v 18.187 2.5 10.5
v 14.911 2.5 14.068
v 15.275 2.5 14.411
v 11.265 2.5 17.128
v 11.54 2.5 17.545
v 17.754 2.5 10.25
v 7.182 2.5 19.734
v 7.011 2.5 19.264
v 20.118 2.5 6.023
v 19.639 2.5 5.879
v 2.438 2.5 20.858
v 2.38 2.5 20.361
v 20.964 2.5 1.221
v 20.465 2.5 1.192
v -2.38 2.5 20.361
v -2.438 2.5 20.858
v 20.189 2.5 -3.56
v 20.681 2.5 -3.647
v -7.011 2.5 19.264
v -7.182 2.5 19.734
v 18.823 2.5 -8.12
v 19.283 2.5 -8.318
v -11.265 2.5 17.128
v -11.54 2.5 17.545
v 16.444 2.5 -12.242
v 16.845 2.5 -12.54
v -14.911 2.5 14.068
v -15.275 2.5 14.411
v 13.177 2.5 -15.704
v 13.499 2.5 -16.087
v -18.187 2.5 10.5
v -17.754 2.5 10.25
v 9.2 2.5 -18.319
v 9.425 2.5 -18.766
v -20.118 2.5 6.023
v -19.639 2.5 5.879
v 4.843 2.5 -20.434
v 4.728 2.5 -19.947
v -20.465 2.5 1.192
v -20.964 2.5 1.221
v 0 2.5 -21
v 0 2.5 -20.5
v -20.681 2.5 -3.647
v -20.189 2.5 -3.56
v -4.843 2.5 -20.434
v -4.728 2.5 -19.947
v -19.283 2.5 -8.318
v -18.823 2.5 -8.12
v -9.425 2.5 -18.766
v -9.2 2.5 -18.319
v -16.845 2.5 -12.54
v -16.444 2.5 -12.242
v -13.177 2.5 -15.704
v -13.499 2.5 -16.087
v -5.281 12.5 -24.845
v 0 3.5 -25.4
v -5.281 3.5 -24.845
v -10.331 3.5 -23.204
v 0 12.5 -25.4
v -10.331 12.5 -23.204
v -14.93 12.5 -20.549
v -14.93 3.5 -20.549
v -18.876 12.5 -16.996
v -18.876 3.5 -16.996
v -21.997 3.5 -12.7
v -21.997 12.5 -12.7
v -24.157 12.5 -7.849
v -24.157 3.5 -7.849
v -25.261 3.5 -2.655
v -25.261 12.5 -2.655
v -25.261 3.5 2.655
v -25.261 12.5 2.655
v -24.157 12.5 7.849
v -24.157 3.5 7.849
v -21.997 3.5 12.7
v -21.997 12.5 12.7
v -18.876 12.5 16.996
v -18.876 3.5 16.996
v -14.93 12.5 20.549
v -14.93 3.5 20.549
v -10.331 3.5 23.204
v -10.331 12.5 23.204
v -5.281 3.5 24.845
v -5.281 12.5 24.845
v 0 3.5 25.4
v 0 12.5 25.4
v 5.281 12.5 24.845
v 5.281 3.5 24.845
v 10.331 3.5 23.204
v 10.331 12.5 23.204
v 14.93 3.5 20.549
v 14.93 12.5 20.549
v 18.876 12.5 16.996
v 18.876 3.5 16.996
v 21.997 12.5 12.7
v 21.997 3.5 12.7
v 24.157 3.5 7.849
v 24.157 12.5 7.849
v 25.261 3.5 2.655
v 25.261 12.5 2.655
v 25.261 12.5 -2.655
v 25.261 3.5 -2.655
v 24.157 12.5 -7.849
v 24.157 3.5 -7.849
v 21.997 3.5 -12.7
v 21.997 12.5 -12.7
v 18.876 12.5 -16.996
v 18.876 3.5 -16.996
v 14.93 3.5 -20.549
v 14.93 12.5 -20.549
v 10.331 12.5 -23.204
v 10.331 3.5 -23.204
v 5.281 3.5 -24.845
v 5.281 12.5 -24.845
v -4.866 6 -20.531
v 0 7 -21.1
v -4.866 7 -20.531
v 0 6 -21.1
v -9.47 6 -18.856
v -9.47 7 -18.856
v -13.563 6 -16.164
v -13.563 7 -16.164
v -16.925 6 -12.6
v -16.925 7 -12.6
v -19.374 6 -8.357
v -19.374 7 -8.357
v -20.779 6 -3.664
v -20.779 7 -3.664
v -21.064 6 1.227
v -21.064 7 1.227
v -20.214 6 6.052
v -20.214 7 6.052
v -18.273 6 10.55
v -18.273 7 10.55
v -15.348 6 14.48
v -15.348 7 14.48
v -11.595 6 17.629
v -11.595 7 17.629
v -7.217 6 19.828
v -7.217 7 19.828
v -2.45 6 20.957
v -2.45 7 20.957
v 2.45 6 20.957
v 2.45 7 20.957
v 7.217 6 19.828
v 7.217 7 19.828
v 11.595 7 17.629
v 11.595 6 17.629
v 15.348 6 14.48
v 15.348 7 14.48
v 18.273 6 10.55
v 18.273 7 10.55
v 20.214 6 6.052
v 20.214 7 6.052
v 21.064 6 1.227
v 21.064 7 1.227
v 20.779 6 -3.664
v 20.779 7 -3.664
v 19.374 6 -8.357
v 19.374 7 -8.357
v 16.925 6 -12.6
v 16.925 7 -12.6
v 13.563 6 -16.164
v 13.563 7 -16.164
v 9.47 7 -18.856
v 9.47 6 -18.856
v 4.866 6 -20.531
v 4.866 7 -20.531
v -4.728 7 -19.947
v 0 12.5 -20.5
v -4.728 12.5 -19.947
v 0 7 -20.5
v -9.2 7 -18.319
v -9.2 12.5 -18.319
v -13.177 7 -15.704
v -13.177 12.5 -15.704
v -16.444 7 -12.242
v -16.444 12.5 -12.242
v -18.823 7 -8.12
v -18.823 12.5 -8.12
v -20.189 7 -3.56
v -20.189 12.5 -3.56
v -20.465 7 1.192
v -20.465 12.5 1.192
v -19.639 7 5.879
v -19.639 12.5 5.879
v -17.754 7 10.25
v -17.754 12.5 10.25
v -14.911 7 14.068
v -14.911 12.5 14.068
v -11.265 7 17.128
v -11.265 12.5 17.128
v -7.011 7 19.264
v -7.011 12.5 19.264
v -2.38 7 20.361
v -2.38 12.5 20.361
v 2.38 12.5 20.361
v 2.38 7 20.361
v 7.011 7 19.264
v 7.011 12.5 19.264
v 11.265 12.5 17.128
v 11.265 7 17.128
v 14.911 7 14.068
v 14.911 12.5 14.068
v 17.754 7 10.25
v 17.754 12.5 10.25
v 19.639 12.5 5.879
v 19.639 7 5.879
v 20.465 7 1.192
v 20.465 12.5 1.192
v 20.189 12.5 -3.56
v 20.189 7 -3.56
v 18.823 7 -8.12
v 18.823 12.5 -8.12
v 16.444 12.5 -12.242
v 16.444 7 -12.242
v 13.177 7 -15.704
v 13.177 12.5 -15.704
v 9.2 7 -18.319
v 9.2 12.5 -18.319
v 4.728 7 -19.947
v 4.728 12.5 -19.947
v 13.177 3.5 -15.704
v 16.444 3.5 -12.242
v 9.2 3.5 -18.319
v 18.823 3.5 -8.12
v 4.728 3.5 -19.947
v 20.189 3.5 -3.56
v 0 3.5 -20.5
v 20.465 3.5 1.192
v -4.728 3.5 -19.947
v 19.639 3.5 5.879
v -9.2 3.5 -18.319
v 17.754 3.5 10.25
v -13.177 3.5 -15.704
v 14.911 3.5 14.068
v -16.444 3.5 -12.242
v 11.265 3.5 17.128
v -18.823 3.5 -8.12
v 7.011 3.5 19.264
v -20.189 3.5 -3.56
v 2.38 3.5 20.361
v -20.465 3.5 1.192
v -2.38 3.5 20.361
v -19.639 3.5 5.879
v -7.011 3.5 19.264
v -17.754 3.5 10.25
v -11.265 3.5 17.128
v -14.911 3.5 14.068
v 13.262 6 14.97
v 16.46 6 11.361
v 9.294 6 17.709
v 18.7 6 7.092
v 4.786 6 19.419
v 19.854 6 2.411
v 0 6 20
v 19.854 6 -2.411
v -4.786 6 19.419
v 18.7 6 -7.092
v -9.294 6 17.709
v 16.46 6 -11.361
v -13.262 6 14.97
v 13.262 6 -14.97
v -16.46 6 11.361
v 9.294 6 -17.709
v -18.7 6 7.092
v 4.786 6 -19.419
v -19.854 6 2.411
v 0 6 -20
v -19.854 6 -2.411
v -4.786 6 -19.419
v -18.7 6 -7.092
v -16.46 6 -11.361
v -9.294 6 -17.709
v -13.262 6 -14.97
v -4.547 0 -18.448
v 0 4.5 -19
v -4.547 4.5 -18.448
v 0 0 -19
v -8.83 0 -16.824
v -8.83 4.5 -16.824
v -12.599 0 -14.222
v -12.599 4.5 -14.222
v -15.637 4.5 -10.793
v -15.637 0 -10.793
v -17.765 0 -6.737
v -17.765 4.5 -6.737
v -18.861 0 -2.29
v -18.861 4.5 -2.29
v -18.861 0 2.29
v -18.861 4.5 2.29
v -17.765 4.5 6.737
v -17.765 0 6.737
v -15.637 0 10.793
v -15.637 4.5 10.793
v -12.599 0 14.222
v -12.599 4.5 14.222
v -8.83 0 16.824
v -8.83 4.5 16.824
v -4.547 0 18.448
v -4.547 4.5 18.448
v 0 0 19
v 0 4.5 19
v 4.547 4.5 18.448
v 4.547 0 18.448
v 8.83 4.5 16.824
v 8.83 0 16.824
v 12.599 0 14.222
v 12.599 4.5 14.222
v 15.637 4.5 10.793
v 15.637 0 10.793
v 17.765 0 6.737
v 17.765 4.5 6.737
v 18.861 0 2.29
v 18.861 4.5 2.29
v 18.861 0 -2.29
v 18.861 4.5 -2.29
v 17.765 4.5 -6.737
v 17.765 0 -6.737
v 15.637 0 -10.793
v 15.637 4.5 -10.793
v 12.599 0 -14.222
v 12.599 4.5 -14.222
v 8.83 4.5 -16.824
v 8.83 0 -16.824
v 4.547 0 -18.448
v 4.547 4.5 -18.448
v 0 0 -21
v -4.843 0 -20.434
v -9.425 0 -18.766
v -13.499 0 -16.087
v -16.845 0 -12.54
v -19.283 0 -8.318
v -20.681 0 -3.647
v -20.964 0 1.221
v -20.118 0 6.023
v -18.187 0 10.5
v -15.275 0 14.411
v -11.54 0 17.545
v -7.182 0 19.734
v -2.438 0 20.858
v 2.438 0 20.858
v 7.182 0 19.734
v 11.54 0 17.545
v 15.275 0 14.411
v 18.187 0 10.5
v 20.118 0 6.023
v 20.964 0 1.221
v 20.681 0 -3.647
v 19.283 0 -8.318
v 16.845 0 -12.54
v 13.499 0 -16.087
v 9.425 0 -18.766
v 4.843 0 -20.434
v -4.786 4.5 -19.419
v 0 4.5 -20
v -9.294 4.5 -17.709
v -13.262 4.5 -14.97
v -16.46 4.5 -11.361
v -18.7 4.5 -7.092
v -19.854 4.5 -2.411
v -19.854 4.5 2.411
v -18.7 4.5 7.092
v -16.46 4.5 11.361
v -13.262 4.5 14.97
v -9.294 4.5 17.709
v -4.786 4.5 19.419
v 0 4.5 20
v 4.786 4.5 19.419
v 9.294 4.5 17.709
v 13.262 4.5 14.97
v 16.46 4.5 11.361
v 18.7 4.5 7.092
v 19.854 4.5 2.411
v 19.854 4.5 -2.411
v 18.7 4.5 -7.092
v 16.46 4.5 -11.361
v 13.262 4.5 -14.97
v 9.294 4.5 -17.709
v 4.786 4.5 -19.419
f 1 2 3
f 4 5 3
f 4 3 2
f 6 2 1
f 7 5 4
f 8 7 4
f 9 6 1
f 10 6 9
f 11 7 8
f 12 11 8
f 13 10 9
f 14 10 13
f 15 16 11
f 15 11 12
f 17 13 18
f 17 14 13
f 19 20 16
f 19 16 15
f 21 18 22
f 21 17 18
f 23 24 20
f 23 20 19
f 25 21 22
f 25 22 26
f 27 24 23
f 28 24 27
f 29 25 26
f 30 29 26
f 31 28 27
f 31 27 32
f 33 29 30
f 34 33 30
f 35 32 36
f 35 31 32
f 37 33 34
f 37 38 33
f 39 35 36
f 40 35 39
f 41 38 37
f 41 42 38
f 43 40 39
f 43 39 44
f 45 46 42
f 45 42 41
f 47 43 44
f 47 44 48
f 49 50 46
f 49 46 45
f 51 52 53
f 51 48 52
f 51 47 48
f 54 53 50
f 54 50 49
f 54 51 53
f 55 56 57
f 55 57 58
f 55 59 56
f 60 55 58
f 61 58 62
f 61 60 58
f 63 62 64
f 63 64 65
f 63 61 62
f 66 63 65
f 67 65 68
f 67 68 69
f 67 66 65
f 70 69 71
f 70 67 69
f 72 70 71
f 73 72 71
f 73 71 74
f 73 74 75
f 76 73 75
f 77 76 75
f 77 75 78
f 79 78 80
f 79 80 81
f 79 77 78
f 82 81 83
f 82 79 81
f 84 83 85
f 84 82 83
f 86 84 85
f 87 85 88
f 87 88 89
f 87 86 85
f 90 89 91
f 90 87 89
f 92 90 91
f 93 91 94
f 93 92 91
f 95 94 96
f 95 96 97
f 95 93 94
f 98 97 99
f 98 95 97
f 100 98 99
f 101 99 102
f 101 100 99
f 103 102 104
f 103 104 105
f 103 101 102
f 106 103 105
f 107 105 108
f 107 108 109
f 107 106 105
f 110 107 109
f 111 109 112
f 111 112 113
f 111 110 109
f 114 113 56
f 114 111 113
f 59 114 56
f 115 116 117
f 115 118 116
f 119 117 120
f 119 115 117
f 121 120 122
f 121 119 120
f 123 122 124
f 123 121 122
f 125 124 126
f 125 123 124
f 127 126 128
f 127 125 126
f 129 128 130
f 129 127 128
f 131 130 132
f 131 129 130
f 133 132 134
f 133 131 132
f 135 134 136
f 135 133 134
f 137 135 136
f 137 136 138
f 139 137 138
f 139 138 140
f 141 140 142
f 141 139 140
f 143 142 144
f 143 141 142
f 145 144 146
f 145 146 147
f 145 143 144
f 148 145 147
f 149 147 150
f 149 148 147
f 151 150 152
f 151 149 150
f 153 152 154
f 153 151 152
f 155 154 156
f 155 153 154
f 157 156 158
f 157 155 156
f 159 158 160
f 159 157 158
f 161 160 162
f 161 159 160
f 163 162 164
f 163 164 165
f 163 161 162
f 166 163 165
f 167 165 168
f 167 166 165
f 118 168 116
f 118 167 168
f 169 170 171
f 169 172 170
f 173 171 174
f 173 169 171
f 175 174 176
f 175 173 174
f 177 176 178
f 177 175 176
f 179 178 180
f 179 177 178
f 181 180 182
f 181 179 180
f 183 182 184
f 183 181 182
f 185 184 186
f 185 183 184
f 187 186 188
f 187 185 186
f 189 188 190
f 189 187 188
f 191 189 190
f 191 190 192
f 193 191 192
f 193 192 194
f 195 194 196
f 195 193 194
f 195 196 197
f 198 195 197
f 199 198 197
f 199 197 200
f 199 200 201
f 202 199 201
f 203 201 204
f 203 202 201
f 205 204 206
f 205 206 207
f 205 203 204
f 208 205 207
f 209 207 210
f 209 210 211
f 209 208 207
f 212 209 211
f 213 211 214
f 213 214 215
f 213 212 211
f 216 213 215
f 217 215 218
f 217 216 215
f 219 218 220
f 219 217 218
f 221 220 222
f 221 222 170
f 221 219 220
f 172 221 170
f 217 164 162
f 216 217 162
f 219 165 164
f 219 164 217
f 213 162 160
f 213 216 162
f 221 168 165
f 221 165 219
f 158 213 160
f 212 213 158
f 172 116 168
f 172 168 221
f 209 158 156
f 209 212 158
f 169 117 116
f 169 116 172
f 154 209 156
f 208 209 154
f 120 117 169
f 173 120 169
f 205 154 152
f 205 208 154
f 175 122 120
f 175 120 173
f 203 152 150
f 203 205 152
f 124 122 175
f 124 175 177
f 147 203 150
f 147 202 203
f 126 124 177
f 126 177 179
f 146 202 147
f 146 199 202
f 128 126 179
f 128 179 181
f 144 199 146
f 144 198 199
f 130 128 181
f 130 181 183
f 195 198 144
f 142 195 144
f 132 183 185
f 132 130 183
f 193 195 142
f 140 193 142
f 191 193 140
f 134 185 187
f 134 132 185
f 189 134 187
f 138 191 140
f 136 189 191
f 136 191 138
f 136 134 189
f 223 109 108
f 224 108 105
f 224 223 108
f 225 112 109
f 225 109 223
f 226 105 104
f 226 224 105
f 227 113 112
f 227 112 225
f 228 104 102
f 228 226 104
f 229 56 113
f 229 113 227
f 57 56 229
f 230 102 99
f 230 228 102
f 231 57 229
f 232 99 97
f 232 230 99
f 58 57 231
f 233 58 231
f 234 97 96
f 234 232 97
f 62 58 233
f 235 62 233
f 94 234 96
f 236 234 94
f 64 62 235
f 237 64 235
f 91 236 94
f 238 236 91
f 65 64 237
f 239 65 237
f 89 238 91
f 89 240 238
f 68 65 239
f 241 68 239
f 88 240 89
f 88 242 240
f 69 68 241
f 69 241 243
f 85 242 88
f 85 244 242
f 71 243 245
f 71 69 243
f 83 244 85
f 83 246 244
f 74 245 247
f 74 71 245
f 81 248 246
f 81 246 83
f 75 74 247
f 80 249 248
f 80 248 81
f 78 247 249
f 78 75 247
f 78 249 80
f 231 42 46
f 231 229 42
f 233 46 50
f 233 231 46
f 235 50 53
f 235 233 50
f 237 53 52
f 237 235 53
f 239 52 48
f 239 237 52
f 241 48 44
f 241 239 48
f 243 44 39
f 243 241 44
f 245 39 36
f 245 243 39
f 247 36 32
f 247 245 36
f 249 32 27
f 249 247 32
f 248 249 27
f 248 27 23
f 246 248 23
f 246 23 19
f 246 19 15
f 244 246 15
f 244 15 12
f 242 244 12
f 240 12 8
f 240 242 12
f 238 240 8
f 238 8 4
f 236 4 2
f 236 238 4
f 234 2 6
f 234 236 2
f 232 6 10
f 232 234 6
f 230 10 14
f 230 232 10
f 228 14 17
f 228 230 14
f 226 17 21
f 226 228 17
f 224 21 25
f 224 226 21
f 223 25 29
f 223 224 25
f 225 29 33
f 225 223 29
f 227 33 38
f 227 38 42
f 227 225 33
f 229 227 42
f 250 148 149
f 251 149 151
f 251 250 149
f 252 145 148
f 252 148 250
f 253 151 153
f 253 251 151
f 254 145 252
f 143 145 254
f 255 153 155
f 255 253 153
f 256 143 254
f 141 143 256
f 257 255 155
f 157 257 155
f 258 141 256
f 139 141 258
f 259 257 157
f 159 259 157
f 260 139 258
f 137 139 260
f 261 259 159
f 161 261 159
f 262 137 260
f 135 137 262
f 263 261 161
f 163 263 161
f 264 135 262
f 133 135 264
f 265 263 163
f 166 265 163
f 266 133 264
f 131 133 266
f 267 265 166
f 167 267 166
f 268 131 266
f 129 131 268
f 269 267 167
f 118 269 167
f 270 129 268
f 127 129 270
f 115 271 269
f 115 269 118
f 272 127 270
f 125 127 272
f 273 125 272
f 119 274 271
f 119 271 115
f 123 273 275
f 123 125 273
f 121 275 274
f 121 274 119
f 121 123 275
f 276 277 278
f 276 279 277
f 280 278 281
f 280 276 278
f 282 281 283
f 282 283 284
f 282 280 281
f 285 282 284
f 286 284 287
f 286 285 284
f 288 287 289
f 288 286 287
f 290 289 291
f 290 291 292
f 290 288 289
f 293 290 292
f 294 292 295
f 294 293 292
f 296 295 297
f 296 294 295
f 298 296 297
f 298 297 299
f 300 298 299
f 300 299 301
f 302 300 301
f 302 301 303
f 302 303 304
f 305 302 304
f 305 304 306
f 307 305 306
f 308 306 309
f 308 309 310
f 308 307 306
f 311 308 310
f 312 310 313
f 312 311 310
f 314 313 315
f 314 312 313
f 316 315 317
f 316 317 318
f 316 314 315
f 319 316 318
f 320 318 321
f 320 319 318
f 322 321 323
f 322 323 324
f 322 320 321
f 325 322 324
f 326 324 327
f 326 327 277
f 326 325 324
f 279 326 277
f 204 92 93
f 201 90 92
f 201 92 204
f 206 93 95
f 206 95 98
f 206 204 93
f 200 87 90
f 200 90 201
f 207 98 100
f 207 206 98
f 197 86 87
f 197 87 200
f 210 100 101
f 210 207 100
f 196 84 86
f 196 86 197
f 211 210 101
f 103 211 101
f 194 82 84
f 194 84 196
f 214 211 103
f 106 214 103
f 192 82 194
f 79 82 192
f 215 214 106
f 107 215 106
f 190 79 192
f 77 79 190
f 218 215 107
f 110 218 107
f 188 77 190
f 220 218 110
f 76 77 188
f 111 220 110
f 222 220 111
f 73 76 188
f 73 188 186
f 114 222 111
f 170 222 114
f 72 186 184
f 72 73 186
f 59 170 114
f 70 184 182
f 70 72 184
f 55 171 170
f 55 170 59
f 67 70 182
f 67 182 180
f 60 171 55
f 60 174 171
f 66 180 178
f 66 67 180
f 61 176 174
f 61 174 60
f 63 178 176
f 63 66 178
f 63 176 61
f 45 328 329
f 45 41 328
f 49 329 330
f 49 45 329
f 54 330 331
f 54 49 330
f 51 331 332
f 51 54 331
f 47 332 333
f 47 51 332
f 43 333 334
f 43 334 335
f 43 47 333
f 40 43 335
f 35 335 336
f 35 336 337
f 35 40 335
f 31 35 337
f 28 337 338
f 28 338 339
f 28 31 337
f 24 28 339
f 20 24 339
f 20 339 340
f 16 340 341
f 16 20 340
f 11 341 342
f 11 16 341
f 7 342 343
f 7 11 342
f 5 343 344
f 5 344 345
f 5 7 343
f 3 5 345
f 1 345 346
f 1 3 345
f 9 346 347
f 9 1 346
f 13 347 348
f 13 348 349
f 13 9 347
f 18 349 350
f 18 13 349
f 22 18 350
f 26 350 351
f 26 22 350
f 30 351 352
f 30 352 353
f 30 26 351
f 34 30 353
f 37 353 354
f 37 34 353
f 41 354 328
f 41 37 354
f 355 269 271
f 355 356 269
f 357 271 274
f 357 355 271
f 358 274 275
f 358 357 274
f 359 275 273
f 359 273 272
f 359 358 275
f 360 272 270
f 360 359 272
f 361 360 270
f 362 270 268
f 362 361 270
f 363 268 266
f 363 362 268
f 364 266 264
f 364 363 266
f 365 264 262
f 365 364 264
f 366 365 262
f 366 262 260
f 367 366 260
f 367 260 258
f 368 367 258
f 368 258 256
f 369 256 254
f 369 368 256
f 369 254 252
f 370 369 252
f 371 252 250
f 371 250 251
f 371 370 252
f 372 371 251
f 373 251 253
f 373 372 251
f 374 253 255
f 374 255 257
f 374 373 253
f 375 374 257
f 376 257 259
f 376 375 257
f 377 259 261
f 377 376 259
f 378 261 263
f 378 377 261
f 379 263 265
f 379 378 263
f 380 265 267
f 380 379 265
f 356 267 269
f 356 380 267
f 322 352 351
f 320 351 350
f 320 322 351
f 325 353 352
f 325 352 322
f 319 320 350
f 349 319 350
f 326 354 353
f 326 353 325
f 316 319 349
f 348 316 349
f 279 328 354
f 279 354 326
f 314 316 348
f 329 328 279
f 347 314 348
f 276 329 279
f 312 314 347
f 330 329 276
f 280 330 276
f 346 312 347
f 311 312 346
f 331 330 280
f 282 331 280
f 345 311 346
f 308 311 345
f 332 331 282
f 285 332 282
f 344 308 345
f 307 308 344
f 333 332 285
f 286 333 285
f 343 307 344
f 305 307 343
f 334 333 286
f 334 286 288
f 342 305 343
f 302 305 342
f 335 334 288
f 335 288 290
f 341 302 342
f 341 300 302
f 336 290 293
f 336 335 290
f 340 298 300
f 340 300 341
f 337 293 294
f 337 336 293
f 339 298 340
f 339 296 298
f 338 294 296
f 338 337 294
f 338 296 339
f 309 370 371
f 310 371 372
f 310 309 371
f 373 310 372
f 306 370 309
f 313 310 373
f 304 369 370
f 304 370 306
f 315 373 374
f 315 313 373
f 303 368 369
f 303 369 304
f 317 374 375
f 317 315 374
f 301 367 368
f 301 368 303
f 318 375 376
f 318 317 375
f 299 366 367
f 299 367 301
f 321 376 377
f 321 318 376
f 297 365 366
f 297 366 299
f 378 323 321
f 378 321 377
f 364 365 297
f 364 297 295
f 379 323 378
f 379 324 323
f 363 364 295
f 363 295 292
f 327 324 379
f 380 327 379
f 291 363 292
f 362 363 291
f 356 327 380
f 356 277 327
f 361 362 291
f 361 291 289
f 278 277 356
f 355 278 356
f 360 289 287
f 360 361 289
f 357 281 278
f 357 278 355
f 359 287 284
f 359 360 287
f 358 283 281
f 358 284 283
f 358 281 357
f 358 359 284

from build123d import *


with BuildPart() as part:
    # 草图1 → 旋转1 (revolve)
    with BuildSketch(Plane.XY, mode=Mode.PRIVATE) as revolve_1_sk:
        Polygon((19, 0), (21, 0), (21, 2.5), (20.5, 2.5), (20.5, 3.5), (25.4, 3.5), (25.4, 12.5), (20.5, 12.5), (20.5, 7), (21.1, 7), (21.1, 6), (20, 6), (20, 4.5), (19, 4.5), align=None)
    revolve(revolve_1_sk.sketch.rotate(Axis((0, 0, 0), (0, 1, 0)), 90), axis=Axis((0, 0, 0), (0, 1, 0)))  # turned: the seam where the file's is


solid = part.part
